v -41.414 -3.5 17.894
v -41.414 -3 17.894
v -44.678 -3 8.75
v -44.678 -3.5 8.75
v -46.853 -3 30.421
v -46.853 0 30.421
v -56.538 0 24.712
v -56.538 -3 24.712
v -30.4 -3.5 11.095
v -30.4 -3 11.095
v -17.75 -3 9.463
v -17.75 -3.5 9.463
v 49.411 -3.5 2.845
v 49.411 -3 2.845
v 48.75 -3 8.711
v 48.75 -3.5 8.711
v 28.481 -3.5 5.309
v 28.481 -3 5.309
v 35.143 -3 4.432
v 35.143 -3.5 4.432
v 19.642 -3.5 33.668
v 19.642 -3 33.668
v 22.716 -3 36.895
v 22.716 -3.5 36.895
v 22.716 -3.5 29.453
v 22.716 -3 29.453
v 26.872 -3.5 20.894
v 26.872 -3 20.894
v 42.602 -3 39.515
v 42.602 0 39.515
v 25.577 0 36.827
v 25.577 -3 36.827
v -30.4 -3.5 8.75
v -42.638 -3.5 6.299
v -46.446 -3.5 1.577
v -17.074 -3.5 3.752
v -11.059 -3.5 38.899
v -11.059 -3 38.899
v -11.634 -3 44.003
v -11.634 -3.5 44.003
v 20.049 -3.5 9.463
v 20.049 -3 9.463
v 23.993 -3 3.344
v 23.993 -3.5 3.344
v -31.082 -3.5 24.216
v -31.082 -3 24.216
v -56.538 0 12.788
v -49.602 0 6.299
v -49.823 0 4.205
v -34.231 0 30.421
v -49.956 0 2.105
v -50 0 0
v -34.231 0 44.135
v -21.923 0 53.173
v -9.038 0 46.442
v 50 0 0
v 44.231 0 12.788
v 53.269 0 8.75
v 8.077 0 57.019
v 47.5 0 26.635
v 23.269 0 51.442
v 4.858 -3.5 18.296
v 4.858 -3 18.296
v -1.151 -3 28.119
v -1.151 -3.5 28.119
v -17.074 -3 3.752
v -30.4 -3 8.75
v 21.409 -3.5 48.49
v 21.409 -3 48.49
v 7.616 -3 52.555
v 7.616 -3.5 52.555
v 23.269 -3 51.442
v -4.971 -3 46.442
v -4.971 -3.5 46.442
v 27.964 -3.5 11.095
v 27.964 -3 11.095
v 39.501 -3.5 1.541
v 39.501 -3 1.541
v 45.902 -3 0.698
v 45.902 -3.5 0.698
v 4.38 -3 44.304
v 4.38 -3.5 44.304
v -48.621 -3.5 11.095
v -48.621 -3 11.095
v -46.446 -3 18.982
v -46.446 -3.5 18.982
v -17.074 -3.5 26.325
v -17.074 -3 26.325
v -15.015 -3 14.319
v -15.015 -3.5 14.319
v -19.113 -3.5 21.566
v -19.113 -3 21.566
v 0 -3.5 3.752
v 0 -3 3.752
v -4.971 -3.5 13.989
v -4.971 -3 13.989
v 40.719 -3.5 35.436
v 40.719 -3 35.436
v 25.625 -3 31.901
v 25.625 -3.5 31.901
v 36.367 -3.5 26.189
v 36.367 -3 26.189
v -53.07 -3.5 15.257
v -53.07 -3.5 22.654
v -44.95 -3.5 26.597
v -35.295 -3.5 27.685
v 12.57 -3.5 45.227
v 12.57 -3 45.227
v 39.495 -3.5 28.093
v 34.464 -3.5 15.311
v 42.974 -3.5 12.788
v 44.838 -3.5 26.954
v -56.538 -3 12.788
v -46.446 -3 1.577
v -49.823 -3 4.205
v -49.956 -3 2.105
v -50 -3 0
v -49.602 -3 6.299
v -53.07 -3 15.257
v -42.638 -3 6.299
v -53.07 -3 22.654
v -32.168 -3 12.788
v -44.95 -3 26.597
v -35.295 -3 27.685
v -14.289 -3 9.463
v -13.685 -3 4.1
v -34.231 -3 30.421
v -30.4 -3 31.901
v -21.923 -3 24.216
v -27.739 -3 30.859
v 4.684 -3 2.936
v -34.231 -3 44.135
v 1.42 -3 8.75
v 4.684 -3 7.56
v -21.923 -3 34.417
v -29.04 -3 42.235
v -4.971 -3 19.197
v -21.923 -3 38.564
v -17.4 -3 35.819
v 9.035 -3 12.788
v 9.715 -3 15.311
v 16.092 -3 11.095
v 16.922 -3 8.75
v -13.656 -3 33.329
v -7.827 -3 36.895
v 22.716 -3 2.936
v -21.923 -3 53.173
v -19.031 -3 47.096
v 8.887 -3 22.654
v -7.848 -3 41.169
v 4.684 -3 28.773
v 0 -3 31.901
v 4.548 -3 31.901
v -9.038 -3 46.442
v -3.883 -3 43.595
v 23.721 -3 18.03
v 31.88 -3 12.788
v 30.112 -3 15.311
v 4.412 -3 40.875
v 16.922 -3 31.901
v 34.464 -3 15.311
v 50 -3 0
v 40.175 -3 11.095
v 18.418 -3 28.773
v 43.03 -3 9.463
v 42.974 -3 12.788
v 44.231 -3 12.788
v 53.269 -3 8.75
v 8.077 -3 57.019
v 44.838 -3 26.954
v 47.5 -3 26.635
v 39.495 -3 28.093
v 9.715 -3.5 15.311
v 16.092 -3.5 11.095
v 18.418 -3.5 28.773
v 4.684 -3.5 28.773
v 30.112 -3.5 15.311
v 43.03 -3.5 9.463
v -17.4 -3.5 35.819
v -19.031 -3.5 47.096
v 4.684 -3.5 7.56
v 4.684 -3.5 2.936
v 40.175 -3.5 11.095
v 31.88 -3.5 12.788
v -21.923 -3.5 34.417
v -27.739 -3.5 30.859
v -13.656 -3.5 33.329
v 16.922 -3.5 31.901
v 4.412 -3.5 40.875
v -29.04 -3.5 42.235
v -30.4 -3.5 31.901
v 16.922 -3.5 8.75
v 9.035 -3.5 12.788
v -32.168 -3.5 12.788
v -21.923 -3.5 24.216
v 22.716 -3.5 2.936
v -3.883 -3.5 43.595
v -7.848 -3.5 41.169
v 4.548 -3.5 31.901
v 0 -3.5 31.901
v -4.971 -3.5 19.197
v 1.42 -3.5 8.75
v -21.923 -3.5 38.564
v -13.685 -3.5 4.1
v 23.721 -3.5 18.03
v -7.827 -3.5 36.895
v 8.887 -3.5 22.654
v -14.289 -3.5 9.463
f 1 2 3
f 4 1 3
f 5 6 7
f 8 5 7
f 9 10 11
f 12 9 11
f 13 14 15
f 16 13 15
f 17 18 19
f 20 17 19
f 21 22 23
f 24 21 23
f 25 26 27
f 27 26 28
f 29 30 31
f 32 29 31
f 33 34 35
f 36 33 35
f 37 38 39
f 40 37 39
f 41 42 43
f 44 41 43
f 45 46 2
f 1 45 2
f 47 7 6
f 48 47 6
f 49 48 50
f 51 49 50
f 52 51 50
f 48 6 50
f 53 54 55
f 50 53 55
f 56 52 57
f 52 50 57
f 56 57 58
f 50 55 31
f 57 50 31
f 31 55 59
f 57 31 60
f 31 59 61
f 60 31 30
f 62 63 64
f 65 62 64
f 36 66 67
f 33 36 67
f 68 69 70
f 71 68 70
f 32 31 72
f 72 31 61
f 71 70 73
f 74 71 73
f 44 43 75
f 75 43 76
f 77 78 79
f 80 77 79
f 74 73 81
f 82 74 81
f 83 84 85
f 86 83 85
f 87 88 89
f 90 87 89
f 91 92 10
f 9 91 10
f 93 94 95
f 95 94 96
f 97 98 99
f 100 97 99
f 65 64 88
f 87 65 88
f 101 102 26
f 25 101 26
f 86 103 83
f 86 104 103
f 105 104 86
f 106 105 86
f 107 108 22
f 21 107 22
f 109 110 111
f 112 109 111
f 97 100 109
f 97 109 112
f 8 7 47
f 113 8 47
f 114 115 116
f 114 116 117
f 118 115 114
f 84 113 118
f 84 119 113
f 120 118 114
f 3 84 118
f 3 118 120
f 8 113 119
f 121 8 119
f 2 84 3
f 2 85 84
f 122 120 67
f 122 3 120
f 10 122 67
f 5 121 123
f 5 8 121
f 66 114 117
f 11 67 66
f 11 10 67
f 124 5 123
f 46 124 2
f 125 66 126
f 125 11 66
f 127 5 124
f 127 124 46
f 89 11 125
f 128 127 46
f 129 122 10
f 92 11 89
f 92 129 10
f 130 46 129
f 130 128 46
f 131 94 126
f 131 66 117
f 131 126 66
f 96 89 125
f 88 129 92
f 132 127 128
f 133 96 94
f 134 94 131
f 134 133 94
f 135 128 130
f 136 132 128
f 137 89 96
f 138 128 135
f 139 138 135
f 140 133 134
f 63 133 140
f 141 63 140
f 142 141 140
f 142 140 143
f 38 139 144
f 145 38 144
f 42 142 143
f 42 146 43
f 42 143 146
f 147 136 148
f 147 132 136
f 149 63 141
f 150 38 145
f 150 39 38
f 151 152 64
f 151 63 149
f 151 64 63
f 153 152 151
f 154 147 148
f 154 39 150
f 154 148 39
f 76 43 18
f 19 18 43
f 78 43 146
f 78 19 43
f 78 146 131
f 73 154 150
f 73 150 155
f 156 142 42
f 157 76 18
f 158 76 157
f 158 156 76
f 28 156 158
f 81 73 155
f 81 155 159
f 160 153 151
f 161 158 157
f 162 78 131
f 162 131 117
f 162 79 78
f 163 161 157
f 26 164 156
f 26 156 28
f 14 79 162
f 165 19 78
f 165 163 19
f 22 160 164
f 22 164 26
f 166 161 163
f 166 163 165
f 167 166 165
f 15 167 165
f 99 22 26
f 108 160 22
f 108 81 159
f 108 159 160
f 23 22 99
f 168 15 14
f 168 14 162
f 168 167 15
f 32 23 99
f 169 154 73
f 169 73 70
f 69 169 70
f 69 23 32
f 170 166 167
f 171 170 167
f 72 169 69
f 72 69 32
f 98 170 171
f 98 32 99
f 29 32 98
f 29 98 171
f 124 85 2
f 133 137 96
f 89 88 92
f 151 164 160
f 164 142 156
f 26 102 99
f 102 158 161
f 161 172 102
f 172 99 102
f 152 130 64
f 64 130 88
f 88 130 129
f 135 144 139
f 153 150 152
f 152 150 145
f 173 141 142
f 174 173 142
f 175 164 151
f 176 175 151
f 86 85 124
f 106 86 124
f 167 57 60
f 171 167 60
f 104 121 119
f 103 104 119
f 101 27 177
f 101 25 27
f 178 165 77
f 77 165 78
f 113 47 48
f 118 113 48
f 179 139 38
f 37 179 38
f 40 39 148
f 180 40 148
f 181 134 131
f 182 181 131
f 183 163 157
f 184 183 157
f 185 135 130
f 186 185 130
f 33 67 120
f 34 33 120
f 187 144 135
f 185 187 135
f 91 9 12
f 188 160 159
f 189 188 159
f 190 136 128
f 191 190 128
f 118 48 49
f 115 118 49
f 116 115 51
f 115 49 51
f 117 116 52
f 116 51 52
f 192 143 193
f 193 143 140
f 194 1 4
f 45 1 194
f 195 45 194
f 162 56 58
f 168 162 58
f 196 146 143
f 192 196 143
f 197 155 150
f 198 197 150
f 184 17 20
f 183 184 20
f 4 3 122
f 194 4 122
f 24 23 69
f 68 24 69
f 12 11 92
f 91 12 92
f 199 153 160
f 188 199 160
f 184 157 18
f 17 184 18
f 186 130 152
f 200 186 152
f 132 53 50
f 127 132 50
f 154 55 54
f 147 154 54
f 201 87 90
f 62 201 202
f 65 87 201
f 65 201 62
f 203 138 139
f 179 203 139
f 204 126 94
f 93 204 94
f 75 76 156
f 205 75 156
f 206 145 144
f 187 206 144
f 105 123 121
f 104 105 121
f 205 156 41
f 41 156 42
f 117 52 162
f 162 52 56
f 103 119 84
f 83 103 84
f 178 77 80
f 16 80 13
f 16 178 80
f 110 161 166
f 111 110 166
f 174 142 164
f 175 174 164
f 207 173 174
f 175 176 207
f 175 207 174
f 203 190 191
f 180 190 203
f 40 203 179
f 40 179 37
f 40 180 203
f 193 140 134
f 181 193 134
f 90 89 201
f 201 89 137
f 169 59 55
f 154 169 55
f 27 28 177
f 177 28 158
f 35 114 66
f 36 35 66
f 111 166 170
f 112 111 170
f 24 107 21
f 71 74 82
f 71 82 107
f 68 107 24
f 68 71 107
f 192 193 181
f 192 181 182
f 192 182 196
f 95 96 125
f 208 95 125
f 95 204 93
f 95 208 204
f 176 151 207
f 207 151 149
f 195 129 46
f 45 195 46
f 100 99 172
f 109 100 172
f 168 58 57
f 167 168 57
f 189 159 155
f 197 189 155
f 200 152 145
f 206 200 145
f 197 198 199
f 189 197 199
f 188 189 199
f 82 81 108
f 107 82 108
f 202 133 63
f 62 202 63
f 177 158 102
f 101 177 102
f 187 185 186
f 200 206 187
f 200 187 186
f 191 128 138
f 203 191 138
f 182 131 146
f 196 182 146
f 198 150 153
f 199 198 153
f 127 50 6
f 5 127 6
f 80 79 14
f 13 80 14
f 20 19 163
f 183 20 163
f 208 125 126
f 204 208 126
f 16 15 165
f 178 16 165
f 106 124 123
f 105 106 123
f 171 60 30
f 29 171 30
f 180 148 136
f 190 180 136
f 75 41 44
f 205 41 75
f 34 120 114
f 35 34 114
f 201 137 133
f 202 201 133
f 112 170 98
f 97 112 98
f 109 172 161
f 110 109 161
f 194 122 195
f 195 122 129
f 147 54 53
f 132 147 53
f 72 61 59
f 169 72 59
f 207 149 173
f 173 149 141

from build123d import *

# Parameters (mm, degrees)
F1_DEPTH = 3
F3_DEPTH = 0.5


with BuildPart() as f1:
    # F0 (on Front) → F1 (new body)
    with BuildSketch(Plane.XZ):
        with BuildLine():
            ThreePointArc((-49.601689, 6.298609), (-49.900323, 3.155595), (-50, 0))
            Line((-50, 0), (50, 0))
            Line((50, 0), (53.269234, 8.75))
            Line((53.269234, 8.75), (44.23077, 12.788462))
            Line((44.23077, 12.788462), (47.500003, 26.634617))
            Line((47.500003, 26.634617), (42.601875, 39.515073))
            Line((42.601875, 39.515073), (25.576925, 36.826923))
            Line((25.576925, 36.826923), (23.269232, 51.44231))
            Line((23.269232, 51.44231), (8.076922, 57.019234))
            Line((8.076922, 57.019234), (-9.038462, 46.442311))
            Line((-9.038462, 46.442311), (-21.923078, 53.17308))
            Line((-21.923078, 53.17308), (-34.230769, 44.134621))
            Line((-34.230769, 44.134621), (-34.230769, 30.420949))
            Line((-34.230769, 30.420949), (-46.853391, 30.420949))
            Line((-46.853391, 30.420949), (-56.538463, 24.71154))
            Line((-56.538463, 24.71154), (-56.538463, 12.788462))
            Line((-56.538463, 12.788462), (-49.601689, 6.298609))
        make_face()
    extrude(amount=F1_DEPTH)

    # F2 (on face) → F3 (join)
    with BuildSketch(Plane.XZ.offset(3)):
        Polygon((-53.070076, 15.257269), (-48.621472, 11.095279), (-46.445761, 18.982239), (-35.295229, 27.685093), (-44.949956, 26.597237), (-53.070076, 22.653757), align=None)
        Polygon((-29.040052, 42.235177), (-30.399874, 31.900536), (-21.923078, 38.563661), (-17.39964, 35.819323), (-11.0592, 38.898515), (-11.634346, 44.002943), (-19.030639, 47.09618), align=None)
        Polygon((7.616132, 52.555275), (-4.971225, 46.442311), (4.379547, 44.303863), (12.570463, 45.226783), (19.641532, 33.668306), (22.715791, 36.895224), (21.409299, 48.490353), align=None)
        Polygon((40.718757, 35.436071), (25.624743, 31.900536), (39.494917, 28.09304), (34.463577, 15.310723), (42.973845, 12.788462), (44.837793, 26.95446), align=None)
        Polygon((48.750002, 8.710921), (43.030452, 9.463494), (39.500919, 1.540576), (45.901778, 0.698357), (49.410935, 2.845136), align=None)
        Polygon((35.143491, 4.432157), (40.174823, 11.095279), (31.879921, 12.788462), (28.481199, 5.308775), align=None)
        Polygon((26.872491, 20.893696), (30.112153, 15.310723), (36.367327, 26.18929), (22.715791, 29.45286), align=None)
        Polygon((4.547521, 31.900536), (16.921889, 31.900536), (4.411539, 40.875357), (-3.883368, 43.594997), (-7.848335, 41.16937), align=None)
        Polygon((-27.739104, 30.859229), (0, 31.900536), (-7.826848, 36.895224), (-13.655543, 33.329433), (-21.923078, 34.417268), align=None)
        Polygon((-41.414421, 17.894384), (-44.677991, 8.75), (-32.16764, 12.788462), (-21.923078, 24.215545), (-31.081754, 24.215545), align=None)
        Polygon((-1.151366, 28.119329), (-17.073629, 26.325272), (-15.014787, 14.319498), (-4.971225, 19.197085), (1.419934, 8.75), (4.85837, 18.295721), align=None)
        Polygon((-19.11336, 21.565899), (-30.399874, 11.095279), (-17.74971, 9.463494), align=None)
        Polygon((18.417694, 28.77295), (4.683502, 28.77295), (8.887457, 22.653757), (9.71484, 15.310723), (16.091682, 11.095279), align=None)
        Polygon((23.720995, 18.030366), (20.049477, 9.463494), (23.992959, 3.3443), (27.963636, 11.095279), align=None)
        Polygon((9.034931, 12.788462), (4.683502, 7.559745), (4.683502, 2.936354), (22.715791, 2.936354), (16.921889, 8.75), align=None)
        Polygon((-13.684647, 4.099629), (0, 3.752247), (-4.971225, 13.98862), (-14.289026, 9.463494), align=None)
        Polygon((-46.445761, 1.576533), (-17.073629, 3.752247), (-30.399874, 8.75), (-42.638261, 6.298609), align=None)
    extrude(amount=F3_DEPTH)


solid = f1.part
